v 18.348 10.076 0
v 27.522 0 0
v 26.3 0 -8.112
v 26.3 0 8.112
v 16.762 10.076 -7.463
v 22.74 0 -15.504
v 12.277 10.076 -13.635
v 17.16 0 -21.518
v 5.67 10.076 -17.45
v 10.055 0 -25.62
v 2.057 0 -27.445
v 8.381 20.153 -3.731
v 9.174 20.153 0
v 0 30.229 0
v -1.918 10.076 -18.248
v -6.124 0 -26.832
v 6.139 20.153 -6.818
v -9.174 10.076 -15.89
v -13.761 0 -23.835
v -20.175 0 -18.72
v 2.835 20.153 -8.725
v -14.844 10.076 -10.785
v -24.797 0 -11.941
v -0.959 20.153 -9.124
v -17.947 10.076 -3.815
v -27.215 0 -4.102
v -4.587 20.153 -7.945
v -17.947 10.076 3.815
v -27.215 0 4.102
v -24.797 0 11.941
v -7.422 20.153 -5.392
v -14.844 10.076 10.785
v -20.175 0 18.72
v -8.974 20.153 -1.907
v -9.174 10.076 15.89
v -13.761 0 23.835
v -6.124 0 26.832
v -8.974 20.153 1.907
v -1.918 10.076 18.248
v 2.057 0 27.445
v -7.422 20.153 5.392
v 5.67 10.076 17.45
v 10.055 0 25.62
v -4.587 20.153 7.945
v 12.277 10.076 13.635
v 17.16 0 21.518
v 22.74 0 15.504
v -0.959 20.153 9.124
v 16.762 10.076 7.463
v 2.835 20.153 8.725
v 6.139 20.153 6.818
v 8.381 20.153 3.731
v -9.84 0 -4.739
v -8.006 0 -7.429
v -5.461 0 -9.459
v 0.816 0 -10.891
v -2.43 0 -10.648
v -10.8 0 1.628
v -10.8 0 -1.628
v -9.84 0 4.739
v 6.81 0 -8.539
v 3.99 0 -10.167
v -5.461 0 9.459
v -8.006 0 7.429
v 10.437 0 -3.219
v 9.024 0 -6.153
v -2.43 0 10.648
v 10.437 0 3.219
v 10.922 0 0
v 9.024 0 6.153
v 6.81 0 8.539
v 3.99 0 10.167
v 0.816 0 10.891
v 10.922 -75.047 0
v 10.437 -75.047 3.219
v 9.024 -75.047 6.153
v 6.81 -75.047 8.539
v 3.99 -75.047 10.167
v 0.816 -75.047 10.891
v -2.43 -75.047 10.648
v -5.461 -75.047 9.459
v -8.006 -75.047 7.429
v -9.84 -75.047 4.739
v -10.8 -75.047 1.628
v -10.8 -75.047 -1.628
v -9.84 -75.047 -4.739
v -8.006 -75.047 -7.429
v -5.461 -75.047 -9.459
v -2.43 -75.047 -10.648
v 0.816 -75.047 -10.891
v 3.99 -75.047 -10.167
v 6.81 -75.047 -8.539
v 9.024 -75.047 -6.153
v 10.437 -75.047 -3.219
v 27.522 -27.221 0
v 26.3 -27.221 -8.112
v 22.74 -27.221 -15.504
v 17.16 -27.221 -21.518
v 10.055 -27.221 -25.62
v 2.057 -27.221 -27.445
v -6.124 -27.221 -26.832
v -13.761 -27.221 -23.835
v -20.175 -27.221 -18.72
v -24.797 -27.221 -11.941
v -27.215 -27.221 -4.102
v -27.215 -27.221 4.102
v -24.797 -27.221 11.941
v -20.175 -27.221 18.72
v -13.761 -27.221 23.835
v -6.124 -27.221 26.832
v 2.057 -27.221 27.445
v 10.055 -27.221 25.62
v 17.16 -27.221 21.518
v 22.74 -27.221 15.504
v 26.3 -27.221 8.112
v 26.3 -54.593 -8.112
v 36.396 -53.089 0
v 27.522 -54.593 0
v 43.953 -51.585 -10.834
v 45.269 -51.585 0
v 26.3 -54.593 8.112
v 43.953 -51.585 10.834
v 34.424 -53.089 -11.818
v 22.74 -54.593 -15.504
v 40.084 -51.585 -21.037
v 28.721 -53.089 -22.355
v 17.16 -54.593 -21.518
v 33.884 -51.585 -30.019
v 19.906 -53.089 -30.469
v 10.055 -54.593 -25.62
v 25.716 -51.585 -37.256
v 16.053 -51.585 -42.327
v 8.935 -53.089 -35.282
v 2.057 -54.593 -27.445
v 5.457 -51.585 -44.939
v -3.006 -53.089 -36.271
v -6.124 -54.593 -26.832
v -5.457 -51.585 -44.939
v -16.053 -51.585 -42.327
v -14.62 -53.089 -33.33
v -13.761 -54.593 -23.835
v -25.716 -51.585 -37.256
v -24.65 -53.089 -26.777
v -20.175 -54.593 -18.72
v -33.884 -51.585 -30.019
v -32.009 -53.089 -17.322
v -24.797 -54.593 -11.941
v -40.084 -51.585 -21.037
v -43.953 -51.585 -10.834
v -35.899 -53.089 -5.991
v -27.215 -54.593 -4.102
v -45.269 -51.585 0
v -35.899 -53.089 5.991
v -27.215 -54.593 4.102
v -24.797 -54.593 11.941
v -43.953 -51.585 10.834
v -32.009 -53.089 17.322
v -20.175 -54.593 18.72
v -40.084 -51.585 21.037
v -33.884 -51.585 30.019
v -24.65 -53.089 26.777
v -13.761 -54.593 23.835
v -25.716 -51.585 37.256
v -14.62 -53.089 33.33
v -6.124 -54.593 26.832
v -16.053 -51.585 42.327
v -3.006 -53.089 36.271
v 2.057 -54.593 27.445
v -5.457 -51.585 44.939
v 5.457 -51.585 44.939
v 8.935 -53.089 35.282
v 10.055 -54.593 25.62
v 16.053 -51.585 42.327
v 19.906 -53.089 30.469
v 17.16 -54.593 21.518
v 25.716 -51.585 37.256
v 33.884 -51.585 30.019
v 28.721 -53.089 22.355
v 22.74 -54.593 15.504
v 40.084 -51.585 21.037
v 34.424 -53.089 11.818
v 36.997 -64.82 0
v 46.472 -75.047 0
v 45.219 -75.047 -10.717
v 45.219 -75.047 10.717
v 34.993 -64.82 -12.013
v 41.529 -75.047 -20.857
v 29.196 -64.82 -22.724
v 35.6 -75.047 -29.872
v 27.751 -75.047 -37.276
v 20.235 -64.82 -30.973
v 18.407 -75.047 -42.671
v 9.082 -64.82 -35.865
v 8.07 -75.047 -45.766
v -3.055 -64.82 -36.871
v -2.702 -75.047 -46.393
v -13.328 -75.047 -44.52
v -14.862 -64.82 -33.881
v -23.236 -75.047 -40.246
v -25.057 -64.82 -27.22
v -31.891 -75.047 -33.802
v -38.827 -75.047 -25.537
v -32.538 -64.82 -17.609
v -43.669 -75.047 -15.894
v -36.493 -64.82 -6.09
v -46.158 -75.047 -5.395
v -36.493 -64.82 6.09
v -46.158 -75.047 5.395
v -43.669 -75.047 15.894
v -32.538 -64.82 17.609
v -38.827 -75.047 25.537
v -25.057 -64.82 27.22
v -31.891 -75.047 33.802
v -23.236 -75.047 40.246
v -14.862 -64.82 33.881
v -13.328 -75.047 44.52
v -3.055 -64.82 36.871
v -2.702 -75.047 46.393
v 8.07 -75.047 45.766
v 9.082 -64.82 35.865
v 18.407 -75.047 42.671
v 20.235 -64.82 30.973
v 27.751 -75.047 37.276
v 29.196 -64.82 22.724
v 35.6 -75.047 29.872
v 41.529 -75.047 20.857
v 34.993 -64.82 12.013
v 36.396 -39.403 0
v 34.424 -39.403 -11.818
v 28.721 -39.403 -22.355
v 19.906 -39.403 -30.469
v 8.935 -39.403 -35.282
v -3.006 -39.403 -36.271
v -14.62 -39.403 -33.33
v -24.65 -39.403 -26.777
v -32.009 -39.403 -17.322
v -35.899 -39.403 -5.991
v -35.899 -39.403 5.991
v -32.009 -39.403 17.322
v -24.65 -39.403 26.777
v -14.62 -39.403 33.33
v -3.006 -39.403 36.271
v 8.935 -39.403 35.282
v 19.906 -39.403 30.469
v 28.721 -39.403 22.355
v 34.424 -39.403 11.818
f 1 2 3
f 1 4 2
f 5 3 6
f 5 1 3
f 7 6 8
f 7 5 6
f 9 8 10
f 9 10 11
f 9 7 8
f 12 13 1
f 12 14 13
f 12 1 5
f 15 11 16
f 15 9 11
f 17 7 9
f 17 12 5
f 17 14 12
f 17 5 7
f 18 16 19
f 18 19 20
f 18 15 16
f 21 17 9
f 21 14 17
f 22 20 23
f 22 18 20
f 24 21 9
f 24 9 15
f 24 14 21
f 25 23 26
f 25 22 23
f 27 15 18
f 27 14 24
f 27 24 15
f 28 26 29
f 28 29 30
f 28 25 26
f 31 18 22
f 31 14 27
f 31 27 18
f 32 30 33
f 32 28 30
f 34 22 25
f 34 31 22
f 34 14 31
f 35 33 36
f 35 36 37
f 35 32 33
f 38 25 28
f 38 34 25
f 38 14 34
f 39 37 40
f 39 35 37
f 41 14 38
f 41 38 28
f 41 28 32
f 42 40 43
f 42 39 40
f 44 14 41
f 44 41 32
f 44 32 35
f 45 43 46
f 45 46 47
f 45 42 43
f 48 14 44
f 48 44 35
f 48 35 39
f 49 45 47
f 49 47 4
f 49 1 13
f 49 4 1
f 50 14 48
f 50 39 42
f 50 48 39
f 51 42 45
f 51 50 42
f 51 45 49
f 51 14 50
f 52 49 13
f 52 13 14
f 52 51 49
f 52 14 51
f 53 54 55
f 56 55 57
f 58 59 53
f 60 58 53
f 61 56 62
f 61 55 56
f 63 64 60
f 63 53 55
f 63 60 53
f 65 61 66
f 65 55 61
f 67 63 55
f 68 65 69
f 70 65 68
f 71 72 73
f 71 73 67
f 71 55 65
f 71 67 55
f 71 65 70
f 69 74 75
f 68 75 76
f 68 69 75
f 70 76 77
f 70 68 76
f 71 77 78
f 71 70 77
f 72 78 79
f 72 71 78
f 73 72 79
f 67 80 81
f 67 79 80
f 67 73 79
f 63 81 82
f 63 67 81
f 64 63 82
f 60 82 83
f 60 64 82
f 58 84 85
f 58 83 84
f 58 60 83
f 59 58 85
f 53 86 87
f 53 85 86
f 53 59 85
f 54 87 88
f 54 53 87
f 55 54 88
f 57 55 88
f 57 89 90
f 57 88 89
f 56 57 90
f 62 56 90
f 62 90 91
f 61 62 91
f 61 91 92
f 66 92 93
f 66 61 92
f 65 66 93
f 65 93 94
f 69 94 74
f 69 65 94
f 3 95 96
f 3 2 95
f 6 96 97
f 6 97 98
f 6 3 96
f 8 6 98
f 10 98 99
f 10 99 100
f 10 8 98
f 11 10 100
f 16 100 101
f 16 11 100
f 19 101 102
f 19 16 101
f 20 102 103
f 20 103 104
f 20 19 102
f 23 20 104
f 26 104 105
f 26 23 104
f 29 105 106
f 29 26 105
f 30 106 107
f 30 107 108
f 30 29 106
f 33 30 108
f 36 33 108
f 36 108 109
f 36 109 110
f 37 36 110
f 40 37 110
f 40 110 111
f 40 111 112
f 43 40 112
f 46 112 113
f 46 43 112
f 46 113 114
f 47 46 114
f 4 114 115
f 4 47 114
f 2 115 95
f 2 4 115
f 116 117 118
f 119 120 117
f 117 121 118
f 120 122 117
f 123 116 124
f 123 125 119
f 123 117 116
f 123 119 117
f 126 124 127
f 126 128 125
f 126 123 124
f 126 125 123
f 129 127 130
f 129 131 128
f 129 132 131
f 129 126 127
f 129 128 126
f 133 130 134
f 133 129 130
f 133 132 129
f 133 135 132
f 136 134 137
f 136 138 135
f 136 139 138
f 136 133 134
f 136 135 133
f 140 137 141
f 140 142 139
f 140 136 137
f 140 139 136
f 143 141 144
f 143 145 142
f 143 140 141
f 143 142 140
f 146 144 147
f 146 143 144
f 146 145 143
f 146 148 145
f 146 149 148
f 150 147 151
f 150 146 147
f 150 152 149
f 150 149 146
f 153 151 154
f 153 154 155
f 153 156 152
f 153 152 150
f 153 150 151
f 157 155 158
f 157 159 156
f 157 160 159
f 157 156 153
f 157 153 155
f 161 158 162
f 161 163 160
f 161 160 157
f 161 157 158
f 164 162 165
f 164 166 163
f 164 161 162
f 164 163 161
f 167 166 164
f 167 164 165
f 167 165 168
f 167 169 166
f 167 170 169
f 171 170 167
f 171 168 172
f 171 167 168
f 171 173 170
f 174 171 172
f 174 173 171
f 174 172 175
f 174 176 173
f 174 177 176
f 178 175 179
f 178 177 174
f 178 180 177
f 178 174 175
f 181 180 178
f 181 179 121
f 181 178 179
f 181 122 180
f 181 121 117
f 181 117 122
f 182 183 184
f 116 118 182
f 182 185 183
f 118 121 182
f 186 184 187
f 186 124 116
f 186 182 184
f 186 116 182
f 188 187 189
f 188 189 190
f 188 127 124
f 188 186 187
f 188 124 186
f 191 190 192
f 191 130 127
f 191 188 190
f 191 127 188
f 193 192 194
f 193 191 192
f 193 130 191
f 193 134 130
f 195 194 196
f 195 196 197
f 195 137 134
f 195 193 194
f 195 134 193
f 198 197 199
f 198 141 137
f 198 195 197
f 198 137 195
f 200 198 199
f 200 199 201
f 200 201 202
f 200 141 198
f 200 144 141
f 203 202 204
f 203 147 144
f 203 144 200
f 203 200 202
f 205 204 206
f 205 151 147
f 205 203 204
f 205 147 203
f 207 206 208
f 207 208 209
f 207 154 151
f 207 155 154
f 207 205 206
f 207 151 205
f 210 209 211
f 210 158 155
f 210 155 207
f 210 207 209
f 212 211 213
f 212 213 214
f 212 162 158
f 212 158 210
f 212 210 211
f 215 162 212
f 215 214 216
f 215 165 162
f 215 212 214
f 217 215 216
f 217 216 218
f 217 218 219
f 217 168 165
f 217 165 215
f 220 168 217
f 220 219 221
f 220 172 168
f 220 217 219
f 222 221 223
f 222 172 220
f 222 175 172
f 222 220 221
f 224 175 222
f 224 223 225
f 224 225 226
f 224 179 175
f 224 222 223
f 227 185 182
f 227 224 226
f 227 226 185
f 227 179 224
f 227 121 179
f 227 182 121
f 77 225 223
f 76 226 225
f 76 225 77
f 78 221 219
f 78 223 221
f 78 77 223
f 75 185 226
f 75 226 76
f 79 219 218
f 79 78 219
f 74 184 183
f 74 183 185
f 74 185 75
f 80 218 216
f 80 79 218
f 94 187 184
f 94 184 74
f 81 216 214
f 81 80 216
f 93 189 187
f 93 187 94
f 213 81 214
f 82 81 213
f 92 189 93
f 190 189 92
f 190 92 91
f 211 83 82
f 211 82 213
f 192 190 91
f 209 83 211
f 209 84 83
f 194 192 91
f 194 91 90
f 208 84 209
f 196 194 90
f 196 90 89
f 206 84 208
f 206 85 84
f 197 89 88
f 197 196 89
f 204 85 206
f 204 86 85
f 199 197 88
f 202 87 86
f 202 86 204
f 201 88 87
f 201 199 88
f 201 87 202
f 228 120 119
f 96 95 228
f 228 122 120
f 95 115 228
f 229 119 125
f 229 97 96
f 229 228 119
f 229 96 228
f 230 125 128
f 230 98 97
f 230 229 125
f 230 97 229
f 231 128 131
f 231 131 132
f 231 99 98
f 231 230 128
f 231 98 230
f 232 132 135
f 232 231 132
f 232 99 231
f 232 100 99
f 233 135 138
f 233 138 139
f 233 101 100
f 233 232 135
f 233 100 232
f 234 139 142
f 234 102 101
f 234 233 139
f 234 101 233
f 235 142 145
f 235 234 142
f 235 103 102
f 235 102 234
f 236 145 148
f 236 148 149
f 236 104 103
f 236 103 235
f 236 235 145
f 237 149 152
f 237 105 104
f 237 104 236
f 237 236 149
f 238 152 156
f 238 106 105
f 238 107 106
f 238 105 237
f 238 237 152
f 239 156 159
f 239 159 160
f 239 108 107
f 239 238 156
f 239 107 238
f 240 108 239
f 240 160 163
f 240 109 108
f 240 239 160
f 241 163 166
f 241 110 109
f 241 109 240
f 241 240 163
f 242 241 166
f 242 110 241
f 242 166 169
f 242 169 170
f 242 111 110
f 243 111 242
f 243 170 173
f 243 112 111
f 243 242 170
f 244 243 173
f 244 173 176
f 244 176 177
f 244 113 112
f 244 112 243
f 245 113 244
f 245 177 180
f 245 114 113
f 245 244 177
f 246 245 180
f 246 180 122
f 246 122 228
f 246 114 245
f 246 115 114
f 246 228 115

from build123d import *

# Parameters (mm, degrees)
F2_R     = 10.922
F3_DEPTH = 429.26


with BuildPart() as f1:
    # F0 (on Top) → F1 (revolve)
    with BuildSketch(Plane.XY):
        Polygon((0, -75.046971), (46.471976, -75.046971), (27.522236, -54.593291), (45.268815, -51.585395), (27.522236, -27.221449), (27.522236, 0), (0, 30.229341), align=None)
    revolve(axis=Axis((0, -22.408815, 0), (0, 1, 0)))

    # F2 (on Front) → F3 (cut)
    with BuildSketch(Plane.XZ):
        Circle(F2_R)
    extrude(amount=F3_DEPTH, mode=Mode.SUBTRACT)


solid = f1.part
